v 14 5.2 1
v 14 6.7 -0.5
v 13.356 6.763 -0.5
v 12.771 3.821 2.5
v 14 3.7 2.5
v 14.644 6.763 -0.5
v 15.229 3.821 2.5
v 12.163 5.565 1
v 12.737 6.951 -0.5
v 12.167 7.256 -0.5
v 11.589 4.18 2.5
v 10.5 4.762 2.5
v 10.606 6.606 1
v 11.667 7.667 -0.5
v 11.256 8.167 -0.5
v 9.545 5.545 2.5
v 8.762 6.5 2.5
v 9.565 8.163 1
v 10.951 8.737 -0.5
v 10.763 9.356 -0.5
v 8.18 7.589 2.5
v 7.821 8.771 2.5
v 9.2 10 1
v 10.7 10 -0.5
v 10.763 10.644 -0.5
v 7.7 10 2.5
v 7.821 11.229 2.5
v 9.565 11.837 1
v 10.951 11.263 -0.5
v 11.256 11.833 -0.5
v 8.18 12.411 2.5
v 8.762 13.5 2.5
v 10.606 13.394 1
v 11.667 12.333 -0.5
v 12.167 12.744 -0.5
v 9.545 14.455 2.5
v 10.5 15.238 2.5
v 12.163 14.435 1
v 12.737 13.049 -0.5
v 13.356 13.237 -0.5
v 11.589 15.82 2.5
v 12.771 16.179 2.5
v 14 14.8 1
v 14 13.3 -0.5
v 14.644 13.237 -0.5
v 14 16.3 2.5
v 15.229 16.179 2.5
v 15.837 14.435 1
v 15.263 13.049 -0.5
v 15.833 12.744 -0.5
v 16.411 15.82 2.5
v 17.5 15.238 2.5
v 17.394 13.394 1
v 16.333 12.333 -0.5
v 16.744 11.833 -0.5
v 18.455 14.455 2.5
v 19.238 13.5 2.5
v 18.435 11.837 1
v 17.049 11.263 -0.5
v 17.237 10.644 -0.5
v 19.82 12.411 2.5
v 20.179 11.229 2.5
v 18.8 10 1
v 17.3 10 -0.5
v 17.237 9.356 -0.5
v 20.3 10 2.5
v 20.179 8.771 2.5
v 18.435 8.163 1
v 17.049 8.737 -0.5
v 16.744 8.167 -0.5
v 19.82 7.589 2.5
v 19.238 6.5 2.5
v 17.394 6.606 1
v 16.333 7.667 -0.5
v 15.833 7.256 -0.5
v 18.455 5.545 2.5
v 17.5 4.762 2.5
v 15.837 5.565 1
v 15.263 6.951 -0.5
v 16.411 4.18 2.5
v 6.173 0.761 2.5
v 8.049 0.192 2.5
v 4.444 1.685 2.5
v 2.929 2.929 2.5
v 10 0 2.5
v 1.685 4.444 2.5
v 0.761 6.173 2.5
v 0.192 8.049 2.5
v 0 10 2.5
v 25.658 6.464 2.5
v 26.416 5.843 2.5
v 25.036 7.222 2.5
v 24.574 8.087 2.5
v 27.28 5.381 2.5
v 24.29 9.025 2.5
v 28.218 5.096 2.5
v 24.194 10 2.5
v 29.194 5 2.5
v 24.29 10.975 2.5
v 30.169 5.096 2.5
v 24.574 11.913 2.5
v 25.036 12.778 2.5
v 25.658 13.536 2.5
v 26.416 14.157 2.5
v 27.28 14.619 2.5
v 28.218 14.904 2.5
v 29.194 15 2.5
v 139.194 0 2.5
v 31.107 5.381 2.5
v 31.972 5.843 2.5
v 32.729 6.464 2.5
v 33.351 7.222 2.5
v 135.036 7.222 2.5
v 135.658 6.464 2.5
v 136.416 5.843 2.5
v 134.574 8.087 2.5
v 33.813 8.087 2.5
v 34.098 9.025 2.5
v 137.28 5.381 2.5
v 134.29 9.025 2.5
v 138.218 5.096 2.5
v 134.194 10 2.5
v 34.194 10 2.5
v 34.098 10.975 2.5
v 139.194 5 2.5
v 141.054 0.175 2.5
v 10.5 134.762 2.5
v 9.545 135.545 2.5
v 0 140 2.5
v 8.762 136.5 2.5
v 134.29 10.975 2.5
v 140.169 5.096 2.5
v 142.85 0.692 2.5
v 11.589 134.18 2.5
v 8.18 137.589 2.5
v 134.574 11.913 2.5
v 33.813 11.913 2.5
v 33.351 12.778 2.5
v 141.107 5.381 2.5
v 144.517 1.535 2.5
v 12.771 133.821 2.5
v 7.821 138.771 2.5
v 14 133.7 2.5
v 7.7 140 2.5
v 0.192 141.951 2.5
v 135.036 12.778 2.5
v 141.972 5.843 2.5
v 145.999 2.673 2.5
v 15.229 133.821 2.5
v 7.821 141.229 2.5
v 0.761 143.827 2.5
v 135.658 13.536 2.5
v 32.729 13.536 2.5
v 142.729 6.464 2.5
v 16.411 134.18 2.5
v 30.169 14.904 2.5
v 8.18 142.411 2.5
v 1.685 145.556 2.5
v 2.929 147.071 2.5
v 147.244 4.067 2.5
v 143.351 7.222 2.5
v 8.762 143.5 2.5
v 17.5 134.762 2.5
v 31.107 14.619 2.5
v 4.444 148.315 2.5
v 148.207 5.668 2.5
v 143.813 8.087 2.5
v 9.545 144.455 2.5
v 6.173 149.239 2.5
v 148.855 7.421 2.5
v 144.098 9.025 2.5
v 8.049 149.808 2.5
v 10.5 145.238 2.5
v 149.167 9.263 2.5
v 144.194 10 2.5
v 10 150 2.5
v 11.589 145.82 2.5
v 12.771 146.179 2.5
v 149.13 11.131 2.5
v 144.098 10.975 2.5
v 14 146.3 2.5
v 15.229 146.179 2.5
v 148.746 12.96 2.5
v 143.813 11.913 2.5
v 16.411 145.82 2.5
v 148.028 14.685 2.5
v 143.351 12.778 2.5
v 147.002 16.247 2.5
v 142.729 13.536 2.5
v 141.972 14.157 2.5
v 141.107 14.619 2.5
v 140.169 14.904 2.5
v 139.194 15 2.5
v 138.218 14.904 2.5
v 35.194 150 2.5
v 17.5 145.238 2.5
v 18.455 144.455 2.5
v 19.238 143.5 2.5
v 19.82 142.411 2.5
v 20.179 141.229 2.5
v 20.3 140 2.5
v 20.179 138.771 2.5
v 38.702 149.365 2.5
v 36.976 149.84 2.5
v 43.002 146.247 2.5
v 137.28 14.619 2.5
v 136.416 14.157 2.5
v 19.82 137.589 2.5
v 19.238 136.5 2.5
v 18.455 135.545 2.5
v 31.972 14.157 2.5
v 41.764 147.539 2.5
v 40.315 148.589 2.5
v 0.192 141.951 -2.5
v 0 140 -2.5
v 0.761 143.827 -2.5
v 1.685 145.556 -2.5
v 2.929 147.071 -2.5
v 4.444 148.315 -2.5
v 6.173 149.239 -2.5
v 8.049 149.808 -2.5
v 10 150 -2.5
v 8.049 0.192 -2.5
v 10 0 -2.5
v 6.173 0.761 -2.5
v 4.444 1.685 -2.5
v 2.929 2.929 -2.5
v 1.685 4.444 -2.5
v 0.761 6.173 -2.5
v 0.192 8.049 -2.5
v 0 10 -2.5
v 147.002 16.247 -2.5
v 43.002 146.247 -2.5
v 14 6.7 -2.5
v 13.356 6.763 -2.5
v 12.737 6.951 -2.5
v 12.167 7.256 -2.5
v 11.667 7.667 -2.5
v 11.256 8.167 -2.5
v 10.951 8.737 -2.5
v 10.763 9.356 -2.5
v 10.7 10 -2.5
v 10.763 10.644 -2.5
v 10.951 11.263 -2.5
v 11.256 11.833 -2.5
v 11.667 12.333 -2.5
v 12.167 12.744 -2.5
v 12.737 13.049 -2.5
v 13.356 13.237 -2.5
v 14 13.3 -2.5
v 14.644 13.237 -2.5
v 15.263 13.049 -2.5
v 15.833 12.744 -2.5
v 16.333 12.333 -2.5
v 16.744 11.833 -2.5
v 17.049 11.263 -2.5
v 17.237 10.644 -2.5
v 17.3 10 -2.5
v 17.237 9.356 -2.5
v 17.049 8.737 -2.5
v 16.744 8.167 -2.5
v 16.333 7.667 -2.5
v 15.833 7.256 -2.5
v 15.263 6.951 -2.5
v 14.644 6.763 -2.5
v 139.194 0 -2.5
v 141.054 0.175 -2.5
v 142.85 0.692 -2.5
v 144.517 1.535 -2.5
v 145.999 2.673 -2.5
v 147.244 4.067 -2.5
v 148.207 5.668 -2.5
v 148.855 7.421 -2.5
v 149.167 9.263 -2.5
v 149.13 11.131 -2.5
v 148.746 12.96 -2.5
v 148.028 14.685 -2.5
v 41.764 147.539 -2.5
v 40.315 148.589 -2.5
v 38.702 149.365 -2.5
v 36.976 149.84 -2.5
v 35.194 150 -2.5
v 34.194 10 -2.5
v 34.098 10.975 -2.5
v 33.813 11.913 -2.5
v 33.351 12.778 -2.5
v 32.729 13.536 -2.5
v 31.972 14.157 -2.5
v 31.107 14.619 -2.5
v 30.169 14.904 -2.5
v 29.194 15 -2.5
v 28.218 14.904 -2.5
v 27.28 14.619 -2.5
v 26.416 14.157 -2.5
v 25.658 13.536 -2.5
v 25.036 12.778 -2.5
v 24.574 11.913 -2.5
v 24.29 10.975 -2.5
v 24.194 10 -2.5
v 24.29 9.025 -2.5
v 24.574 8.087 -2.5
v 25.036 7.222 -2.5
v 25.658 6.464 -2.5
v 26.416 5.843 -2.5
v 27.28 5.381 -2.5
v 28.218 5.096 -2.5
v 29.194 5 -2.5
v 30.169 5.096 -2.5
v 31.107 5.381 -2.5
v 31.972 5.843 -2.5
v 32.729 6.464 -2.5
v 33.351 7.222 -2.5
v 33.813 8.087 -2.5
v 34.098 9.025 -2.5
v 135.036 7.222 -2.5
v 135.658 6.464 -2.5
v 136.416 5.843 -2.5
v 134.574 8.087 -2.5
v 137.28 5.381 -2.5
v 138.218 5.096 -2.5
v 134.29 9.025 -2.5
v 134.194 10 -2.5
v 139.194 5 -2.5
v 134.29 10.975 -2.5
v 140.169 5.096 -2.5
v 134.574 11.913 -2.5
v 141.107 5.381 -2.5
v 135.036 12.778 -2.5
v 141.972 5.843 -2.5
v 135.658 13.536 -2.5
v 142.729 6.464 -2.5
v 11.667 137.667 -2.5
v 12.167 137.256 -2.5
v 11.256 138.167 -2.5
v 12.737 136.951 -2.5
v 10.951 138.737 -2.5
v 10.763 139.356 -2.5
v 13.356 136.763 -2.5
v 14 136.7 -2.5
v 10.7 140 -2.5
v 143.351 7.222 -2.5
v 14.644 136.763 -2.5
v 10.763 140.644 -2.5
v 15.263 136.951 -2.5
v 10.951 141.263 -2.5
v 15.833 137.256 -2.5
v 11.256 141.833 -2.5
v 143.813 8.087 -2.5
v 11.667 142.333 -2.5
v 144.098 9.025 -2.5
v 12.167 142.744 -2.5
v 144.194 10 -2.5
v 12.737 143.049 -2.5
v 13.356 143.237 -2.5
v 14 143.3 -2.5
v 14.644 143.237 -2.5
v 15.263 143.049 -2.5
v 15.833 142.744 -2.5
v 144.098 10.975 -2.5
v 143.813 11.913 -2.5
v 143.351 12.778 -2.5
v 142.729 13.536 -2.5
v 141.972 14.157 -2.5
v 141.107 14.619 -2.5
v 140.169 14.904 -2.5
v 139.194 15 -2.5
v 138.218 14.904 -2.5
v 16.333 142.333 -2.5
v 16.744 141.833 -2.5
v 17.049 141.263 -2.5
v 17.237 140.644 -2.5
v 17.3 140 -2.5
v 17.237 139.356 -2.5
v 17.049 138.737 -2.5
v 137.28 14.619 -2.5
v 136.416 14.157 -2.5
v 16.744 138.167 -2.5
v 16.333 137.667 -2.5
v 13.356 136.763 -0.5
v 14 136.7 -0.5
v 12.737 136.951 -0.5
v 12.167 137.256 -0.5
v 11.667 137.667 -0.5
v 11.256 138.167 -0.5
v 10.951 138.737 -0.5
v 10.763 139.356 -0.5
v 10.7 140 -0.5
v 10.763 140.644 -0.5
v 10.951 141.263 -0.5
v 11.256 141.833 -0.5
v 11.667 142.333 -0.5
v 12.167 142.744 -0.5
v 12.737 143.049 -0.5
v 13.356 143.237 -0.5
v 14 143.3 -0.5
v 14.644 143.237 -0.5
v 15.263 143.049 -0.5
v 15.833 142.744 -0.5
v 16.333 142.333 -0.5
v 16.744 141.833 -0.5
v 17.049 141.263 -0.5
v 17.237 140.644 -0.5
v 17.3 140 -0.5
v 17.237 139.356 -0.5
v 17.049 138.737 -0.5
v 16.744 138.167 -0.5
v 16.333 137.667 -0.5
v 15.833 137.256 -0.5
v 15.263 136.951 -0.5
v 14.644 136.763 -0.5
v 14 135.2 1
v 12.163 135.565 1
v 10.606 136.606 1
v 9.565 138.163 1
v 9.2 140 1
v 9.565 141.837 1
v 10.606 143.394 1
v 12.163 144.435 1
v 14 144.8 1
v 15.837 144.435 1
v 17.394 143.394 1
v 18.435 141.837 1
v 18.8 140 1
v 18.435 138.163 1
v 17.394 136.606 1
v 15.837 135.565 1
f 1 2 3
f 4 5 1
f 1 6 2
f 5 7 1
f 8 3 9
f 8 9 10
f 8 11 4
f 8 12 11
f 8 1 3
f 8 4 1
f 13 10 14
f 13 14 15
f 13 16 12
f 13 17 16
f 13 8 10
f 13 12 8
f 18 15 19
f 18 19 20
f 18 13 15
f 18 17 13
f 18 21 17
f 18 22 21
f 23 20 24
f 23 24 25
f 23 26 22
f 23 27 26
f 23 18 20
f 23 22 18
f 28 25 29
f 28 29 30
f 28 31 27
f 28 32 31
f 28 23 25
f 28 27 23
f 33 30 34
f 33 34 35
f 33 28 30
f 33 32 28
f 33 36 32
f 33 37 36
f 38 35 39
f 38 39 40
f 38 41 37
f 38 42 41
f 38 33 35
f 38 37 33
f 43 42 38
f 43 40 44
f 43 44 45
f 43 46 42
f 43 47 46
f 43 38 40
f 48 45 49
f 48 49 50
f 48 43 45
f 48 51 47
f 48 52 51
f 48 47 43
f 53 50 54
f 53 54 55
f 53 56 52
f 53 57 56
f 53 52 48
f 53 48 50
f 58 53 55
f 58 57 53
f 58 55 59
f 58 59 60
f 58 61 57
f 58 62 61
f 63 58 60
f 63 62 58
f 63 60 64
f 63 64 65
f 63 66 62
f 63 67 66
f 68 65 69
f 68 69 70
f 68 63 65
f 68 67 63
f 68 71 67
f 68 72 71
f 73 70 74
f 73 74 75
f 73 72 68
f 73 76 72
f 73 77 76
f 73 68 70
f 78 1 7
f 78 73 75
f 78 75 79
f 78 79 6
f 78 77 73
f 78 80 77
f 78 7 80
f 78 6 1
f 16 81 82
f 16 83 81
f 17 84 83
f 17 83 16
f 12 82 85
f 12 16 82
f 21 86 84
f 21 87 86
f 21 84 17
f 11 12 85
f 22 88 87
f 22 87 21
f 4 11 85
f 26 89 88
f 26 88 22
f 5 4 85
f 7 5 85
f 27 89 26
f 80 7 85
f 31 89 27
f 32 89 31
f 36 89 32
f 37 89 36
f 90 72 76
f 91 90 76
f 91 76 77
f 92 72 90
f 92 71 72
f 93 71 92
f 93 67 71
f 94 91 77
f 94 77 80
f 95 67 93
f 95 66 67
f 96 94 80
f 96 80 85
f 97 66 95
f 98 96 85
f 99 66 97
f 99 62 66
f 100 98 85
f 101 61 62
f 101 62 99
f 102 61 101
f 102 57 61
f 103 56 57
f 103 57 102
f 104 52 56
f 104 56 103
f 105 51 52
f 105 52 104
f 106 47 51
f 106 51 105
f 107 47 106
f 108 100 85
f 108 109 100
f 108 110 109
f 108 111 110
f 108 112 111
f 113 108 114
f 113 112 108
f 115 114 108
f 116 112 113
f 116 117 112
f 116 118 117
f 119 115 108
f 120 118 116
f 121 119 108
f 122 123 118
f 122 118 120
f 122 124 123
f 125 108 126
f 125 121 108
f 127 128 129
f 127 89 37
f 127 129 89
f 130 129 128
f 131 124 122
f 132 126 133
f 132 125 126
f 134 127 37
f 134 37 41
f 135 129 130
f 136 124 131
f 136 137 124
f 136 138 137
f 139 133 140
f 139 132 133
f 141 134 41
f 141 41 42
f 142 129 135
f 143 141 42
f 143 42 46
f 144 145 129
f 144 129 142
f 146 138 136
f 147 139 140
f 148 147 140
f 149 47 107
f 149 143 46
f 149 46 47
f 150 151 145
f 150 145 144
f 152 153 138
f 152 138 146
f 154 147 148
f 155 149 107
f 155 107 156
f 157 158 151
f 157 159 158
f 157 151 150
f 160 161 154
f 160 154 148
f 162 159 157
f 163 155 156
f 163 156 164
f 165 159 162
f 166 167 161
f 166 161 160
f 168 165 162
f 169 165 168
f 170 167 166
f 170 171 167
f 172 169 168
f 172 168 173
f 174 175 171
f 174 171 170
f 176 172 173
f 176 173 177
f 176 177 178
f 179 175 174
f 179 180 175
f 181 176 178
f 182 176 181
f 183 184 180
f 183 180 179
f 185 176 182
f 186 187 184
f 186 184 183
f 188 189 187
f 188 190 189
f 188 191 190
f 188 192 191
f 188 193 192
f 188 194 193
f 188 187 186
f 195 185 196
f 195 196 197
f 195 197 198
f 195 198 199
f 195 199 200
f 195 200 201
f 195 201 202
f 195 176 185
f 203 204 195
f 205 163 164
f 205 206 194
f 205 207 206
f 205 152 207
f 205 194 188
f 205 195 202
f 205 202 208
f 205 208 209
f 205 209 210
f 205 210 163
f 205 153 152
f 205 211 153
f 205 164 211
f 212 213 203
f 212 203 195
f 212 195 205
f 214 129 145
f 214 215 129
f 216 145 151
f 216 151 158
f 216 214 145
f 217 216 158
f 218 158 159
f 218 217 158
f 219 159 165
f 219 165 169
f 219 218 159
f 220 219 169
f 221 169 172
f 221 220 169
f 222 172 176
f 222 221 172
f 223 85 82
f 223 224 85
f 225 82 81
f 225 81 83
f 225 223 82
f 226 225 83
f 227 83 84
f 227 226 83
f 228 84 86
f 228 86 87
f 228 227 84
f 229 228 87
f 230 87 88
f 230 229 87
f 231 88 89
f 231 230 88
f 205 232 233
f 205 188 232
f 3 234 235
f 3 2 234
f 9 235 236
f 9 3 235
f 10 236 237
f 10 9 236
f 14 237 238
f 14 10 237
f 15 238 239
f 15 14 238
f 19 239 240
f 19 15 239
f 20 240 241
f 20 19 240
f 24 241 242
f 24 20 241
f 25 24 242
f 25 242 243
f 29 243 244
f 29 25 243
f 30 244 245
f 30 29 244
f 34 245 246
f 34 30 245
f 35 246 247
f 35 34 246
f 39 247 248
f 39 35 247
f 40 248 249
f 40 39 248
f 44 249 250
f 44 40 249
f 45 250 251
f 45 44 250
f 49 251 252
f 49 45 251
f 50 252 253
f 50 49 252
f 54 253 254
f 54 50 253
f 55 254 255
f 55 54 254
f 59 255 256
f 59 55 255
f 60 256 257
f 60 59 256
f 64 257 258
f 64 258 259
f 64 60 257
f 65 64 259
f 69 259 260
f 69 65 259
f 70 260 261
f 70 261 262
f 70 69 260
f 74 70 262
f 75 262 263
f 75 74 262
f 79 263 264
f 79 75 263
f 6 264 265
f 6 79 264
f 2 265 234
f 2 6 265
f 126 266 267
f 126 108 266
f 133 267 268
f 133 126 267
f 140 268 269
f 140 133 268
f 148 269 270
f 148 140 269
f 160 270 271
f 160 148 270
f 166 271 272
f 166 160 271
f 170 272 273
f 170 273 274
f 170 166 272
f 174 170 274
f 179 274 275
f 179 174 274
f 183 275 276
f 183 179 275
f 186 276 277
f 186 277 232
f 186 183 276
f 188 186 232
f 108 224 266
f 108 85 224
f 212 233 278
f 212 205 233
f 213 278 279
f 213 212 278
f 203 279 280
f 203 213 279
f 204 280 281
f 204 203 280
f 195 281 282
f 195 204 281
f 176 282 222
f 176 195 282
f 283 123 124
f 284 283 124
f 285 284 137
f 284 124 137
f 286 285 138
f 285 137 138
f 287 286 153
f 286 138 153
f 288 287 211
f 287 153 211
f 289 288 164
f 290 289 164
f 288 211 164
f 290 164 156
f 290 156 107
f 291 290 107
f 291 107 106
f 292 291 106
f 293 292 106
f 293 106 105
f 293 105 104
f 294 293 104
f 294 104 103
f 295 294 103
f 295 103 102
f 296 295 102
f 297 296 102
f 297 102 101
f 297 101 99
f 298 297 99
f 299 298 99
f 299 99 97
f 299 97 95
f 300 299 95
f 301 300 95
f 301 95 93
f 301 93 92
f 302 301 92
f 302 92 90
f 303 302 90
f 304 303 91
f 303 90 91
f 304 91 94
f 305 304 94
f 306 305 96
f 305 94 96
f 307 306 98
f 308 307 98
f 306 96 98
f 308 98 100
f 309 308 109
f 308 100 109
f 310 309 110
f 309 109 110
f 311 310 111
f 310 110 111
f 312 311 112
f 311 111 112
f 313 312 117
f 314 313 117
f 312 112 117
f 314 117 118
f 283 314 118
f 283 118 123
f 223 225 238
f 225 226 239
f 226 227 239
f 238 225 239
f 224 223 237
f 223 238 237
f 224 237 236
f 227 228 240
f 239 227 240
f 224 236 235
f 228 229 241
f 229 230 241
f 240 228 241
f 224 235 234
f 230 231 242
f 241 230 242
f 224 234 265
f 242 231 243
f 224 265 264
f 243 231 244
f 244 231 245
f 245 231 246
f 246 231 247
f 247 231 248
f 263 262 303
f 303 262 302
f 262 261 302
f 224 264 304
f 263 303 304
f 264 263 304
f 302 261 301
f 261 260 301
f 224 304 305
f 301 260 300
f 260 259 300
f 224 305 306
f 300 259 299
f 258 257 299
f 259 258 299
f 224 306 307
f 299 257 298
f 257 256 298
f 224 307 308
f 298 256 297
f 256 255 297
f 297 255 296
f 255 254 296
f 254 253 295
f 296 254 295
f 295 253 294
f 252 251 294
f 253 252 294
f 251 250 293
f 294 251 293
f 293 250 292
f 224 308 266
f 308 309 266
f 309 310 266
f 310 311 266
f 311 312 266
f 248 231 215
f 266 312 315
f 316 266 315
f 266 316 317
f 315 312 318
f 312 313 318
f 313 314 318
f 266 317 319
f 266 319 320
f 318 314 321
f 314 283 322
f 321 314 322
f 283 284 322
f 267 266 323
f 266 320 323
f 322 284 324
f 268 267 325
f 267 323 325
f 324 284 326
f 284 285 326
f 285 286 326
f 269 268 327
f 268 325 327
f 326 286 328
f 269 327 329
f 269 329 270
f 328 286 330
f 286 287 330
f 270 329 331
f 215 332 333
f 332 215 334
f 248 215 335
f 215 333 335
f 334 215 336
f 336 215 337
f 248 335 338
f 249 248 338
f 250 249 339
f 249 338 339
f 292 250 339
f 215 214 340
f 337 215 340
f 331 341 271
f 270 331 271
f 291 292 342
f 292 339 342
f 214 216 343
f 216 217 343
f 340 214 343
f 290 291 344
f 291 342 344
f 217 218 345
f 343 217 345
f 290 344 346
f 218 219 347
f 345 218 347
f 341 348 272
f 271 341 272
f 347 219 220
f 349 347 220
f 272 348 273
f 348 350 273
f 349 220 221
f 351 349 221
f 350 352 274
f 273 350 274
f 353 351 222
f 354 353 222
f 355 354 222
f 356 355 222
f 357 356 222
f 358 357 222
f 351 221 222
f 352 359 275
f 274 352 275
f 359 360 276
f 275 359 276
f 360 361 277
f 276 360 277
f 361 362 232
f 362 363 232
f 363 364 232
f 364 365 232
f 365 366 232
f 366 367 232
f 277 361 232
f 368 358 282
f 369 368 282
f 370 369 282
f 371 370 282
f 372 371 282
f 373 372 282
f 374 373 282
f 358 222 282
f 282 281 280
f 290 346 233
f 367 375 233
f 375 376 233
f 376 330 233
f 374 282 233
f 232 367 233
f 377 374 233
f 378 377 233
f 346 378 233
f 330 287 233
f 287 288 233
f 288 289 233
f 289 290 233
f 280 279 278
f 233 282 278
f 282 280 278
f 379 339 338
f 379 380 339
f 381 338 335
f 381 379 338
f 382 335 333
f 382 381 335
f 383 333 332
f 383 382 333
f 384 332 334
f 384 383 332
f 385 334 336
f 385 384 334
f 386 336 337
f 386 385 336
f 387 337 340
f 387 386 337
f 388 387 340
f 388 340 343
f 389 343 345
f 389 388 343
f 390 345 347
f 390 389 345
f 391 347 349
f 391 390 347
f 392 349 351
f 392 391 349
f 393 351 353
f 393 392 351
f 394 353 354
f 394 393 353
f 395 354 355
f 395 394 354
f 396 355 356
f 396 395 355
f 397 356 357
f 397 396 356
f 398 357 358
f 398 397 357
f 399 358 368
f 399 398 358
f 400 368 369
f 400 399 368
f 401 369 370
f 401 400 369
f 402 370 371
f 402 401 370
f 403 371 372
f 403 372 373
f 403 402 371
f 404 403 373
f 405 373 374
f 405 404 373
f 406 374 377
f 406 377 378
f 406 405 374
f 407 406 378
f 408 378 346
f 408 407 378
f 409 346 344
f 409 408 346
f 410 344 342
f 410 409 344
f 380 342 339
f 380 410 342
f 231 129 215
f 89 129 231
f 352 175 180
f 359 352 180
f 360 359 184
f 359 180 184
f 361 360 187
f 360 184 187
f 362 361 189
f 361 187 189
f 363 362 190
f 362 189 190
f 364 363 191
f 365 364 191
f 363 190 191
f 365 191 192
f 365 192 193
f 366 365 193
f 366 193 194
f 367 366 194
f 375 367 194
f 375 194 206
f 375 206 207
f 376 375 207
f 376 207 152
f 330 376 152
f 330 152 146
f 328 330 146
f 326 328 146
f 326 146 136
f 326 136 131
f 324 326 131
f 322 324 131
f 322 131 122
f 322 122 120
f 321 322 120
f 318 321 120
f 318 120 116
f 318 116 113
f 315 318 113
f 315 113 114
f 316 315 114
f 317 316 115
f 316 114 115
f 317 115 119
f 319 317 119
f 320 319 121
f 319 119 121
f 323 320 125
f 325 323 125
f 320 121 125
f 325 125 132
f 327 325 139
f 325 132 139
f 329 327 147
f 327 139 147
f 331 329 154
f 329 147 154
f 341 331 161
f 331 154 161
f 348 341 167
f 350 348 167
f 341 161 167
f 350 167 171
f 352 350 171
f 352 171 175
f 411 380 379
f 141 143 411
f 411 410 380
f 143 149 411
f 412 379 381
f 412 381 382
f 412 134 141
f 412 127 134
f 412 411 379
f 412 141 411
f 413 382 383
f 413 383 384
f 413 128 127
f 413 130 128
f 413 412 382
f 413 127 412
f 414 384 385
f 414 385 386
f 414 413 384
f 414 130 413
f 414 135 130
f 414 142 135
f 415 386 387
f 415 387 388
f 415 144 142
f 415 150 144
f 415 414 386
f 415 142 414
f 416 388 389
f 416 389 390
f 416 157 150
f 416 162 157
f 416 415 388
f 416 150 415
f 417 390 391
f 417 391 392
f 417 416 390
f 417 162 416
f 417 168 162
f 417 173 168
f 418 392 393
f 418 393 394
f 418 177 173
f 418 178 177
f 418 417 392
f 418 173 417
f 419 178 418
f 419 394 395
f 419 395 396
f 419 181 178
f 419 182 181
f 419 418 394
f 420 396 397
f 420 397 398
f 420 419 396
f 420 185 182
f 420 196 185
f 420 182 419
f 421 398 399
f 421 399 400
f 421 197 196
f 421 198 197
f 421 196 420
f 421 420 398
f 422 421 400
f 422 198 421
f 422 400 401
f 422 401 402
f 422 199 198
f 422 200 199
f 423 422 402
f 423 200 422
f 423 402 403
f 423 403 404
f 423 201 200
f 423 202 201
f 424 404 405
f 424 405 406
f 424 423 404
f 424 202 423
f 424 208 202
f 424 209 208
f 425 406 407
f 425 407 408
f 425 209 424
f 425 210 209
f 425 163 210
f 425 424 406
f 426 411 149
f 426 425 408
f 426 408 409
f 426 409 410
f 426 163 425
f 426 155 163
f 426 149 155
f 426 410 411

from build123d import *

# Parameters (mm, degrees)
EXTRUDE_410_DEPTH         = 2.5
HOLE_WIZARD_M6_AT_2_COUNT = 2
HOLE_WIZARD_M6_AT_2_PITCH = 130
FILLET_1_R                = 10
SKETCH_2_R                = 5
CUT_EXTRUDE_1_DEPTH       = 212.621774622


with BuildPart() as part:
    # Эскиз1 → Extrude 410 (new, symmetric)
    with BuildSketch(Plane.XY):
        Polygon((0, 0), (160, 0), (40, 150), (0, 150), align=None)
    extrude(amount=EXTRUDE_410_DEPTH, both=True)

    # Эскиз4 → Крепление-M6 (revolve, cut)
    with BuildSketch(Plane(origin=(14, 140, 2.5), x_dir=(0, -1, 0), z_dir=(1, 0, 0))):
        Polygon((0, 0), (0, 5), (3.3, 5), (3.3, 3), (6.3, 0), align=None)
    hole_wizard_m6 = revolve(axis=Axis((14, 140, 8.85), (0, 0, -1)), mode=Mode.SUBTRACT)

    # Крепление-M6 at 2: Крепление-M6 ×2
    with Locations(*[(0, -i * HOLE_WIZARD_M6_AT_2_PITCH, 0) for i in range(1, HOLE_WIZARD_M6_AT_2_COUNT)]):
        add(hole_wizard_m6, mode=Mode.SUBTRACT)

    # Скругление1
    fillet_1_edges = [part.edges().sort_by_distance(p)[0] for p in [
        (0, 150, 0),
        (40, 150, 0),
        (160, 0, 0),
        (0, 0, 0),
    ]]
    fillet(fillet_1_edges, radius=FILLET_1_R)

    # Эскиз2 → Вырез-Вытянуть1 (cut, through all)
    with BuildSketch(Plane.XY.offset(2.5)):
        with Locations((139.193751525, 10)):
            Circle(SKETCH_2_R)
        with Locations((29.193751525, 10)):
            Circle(SKETCH_2_R)
    extrude(amount=-CUT_EXTRUDE_1_DEPTH, mode=Mode.SUBTRACT)


solid = part.part
